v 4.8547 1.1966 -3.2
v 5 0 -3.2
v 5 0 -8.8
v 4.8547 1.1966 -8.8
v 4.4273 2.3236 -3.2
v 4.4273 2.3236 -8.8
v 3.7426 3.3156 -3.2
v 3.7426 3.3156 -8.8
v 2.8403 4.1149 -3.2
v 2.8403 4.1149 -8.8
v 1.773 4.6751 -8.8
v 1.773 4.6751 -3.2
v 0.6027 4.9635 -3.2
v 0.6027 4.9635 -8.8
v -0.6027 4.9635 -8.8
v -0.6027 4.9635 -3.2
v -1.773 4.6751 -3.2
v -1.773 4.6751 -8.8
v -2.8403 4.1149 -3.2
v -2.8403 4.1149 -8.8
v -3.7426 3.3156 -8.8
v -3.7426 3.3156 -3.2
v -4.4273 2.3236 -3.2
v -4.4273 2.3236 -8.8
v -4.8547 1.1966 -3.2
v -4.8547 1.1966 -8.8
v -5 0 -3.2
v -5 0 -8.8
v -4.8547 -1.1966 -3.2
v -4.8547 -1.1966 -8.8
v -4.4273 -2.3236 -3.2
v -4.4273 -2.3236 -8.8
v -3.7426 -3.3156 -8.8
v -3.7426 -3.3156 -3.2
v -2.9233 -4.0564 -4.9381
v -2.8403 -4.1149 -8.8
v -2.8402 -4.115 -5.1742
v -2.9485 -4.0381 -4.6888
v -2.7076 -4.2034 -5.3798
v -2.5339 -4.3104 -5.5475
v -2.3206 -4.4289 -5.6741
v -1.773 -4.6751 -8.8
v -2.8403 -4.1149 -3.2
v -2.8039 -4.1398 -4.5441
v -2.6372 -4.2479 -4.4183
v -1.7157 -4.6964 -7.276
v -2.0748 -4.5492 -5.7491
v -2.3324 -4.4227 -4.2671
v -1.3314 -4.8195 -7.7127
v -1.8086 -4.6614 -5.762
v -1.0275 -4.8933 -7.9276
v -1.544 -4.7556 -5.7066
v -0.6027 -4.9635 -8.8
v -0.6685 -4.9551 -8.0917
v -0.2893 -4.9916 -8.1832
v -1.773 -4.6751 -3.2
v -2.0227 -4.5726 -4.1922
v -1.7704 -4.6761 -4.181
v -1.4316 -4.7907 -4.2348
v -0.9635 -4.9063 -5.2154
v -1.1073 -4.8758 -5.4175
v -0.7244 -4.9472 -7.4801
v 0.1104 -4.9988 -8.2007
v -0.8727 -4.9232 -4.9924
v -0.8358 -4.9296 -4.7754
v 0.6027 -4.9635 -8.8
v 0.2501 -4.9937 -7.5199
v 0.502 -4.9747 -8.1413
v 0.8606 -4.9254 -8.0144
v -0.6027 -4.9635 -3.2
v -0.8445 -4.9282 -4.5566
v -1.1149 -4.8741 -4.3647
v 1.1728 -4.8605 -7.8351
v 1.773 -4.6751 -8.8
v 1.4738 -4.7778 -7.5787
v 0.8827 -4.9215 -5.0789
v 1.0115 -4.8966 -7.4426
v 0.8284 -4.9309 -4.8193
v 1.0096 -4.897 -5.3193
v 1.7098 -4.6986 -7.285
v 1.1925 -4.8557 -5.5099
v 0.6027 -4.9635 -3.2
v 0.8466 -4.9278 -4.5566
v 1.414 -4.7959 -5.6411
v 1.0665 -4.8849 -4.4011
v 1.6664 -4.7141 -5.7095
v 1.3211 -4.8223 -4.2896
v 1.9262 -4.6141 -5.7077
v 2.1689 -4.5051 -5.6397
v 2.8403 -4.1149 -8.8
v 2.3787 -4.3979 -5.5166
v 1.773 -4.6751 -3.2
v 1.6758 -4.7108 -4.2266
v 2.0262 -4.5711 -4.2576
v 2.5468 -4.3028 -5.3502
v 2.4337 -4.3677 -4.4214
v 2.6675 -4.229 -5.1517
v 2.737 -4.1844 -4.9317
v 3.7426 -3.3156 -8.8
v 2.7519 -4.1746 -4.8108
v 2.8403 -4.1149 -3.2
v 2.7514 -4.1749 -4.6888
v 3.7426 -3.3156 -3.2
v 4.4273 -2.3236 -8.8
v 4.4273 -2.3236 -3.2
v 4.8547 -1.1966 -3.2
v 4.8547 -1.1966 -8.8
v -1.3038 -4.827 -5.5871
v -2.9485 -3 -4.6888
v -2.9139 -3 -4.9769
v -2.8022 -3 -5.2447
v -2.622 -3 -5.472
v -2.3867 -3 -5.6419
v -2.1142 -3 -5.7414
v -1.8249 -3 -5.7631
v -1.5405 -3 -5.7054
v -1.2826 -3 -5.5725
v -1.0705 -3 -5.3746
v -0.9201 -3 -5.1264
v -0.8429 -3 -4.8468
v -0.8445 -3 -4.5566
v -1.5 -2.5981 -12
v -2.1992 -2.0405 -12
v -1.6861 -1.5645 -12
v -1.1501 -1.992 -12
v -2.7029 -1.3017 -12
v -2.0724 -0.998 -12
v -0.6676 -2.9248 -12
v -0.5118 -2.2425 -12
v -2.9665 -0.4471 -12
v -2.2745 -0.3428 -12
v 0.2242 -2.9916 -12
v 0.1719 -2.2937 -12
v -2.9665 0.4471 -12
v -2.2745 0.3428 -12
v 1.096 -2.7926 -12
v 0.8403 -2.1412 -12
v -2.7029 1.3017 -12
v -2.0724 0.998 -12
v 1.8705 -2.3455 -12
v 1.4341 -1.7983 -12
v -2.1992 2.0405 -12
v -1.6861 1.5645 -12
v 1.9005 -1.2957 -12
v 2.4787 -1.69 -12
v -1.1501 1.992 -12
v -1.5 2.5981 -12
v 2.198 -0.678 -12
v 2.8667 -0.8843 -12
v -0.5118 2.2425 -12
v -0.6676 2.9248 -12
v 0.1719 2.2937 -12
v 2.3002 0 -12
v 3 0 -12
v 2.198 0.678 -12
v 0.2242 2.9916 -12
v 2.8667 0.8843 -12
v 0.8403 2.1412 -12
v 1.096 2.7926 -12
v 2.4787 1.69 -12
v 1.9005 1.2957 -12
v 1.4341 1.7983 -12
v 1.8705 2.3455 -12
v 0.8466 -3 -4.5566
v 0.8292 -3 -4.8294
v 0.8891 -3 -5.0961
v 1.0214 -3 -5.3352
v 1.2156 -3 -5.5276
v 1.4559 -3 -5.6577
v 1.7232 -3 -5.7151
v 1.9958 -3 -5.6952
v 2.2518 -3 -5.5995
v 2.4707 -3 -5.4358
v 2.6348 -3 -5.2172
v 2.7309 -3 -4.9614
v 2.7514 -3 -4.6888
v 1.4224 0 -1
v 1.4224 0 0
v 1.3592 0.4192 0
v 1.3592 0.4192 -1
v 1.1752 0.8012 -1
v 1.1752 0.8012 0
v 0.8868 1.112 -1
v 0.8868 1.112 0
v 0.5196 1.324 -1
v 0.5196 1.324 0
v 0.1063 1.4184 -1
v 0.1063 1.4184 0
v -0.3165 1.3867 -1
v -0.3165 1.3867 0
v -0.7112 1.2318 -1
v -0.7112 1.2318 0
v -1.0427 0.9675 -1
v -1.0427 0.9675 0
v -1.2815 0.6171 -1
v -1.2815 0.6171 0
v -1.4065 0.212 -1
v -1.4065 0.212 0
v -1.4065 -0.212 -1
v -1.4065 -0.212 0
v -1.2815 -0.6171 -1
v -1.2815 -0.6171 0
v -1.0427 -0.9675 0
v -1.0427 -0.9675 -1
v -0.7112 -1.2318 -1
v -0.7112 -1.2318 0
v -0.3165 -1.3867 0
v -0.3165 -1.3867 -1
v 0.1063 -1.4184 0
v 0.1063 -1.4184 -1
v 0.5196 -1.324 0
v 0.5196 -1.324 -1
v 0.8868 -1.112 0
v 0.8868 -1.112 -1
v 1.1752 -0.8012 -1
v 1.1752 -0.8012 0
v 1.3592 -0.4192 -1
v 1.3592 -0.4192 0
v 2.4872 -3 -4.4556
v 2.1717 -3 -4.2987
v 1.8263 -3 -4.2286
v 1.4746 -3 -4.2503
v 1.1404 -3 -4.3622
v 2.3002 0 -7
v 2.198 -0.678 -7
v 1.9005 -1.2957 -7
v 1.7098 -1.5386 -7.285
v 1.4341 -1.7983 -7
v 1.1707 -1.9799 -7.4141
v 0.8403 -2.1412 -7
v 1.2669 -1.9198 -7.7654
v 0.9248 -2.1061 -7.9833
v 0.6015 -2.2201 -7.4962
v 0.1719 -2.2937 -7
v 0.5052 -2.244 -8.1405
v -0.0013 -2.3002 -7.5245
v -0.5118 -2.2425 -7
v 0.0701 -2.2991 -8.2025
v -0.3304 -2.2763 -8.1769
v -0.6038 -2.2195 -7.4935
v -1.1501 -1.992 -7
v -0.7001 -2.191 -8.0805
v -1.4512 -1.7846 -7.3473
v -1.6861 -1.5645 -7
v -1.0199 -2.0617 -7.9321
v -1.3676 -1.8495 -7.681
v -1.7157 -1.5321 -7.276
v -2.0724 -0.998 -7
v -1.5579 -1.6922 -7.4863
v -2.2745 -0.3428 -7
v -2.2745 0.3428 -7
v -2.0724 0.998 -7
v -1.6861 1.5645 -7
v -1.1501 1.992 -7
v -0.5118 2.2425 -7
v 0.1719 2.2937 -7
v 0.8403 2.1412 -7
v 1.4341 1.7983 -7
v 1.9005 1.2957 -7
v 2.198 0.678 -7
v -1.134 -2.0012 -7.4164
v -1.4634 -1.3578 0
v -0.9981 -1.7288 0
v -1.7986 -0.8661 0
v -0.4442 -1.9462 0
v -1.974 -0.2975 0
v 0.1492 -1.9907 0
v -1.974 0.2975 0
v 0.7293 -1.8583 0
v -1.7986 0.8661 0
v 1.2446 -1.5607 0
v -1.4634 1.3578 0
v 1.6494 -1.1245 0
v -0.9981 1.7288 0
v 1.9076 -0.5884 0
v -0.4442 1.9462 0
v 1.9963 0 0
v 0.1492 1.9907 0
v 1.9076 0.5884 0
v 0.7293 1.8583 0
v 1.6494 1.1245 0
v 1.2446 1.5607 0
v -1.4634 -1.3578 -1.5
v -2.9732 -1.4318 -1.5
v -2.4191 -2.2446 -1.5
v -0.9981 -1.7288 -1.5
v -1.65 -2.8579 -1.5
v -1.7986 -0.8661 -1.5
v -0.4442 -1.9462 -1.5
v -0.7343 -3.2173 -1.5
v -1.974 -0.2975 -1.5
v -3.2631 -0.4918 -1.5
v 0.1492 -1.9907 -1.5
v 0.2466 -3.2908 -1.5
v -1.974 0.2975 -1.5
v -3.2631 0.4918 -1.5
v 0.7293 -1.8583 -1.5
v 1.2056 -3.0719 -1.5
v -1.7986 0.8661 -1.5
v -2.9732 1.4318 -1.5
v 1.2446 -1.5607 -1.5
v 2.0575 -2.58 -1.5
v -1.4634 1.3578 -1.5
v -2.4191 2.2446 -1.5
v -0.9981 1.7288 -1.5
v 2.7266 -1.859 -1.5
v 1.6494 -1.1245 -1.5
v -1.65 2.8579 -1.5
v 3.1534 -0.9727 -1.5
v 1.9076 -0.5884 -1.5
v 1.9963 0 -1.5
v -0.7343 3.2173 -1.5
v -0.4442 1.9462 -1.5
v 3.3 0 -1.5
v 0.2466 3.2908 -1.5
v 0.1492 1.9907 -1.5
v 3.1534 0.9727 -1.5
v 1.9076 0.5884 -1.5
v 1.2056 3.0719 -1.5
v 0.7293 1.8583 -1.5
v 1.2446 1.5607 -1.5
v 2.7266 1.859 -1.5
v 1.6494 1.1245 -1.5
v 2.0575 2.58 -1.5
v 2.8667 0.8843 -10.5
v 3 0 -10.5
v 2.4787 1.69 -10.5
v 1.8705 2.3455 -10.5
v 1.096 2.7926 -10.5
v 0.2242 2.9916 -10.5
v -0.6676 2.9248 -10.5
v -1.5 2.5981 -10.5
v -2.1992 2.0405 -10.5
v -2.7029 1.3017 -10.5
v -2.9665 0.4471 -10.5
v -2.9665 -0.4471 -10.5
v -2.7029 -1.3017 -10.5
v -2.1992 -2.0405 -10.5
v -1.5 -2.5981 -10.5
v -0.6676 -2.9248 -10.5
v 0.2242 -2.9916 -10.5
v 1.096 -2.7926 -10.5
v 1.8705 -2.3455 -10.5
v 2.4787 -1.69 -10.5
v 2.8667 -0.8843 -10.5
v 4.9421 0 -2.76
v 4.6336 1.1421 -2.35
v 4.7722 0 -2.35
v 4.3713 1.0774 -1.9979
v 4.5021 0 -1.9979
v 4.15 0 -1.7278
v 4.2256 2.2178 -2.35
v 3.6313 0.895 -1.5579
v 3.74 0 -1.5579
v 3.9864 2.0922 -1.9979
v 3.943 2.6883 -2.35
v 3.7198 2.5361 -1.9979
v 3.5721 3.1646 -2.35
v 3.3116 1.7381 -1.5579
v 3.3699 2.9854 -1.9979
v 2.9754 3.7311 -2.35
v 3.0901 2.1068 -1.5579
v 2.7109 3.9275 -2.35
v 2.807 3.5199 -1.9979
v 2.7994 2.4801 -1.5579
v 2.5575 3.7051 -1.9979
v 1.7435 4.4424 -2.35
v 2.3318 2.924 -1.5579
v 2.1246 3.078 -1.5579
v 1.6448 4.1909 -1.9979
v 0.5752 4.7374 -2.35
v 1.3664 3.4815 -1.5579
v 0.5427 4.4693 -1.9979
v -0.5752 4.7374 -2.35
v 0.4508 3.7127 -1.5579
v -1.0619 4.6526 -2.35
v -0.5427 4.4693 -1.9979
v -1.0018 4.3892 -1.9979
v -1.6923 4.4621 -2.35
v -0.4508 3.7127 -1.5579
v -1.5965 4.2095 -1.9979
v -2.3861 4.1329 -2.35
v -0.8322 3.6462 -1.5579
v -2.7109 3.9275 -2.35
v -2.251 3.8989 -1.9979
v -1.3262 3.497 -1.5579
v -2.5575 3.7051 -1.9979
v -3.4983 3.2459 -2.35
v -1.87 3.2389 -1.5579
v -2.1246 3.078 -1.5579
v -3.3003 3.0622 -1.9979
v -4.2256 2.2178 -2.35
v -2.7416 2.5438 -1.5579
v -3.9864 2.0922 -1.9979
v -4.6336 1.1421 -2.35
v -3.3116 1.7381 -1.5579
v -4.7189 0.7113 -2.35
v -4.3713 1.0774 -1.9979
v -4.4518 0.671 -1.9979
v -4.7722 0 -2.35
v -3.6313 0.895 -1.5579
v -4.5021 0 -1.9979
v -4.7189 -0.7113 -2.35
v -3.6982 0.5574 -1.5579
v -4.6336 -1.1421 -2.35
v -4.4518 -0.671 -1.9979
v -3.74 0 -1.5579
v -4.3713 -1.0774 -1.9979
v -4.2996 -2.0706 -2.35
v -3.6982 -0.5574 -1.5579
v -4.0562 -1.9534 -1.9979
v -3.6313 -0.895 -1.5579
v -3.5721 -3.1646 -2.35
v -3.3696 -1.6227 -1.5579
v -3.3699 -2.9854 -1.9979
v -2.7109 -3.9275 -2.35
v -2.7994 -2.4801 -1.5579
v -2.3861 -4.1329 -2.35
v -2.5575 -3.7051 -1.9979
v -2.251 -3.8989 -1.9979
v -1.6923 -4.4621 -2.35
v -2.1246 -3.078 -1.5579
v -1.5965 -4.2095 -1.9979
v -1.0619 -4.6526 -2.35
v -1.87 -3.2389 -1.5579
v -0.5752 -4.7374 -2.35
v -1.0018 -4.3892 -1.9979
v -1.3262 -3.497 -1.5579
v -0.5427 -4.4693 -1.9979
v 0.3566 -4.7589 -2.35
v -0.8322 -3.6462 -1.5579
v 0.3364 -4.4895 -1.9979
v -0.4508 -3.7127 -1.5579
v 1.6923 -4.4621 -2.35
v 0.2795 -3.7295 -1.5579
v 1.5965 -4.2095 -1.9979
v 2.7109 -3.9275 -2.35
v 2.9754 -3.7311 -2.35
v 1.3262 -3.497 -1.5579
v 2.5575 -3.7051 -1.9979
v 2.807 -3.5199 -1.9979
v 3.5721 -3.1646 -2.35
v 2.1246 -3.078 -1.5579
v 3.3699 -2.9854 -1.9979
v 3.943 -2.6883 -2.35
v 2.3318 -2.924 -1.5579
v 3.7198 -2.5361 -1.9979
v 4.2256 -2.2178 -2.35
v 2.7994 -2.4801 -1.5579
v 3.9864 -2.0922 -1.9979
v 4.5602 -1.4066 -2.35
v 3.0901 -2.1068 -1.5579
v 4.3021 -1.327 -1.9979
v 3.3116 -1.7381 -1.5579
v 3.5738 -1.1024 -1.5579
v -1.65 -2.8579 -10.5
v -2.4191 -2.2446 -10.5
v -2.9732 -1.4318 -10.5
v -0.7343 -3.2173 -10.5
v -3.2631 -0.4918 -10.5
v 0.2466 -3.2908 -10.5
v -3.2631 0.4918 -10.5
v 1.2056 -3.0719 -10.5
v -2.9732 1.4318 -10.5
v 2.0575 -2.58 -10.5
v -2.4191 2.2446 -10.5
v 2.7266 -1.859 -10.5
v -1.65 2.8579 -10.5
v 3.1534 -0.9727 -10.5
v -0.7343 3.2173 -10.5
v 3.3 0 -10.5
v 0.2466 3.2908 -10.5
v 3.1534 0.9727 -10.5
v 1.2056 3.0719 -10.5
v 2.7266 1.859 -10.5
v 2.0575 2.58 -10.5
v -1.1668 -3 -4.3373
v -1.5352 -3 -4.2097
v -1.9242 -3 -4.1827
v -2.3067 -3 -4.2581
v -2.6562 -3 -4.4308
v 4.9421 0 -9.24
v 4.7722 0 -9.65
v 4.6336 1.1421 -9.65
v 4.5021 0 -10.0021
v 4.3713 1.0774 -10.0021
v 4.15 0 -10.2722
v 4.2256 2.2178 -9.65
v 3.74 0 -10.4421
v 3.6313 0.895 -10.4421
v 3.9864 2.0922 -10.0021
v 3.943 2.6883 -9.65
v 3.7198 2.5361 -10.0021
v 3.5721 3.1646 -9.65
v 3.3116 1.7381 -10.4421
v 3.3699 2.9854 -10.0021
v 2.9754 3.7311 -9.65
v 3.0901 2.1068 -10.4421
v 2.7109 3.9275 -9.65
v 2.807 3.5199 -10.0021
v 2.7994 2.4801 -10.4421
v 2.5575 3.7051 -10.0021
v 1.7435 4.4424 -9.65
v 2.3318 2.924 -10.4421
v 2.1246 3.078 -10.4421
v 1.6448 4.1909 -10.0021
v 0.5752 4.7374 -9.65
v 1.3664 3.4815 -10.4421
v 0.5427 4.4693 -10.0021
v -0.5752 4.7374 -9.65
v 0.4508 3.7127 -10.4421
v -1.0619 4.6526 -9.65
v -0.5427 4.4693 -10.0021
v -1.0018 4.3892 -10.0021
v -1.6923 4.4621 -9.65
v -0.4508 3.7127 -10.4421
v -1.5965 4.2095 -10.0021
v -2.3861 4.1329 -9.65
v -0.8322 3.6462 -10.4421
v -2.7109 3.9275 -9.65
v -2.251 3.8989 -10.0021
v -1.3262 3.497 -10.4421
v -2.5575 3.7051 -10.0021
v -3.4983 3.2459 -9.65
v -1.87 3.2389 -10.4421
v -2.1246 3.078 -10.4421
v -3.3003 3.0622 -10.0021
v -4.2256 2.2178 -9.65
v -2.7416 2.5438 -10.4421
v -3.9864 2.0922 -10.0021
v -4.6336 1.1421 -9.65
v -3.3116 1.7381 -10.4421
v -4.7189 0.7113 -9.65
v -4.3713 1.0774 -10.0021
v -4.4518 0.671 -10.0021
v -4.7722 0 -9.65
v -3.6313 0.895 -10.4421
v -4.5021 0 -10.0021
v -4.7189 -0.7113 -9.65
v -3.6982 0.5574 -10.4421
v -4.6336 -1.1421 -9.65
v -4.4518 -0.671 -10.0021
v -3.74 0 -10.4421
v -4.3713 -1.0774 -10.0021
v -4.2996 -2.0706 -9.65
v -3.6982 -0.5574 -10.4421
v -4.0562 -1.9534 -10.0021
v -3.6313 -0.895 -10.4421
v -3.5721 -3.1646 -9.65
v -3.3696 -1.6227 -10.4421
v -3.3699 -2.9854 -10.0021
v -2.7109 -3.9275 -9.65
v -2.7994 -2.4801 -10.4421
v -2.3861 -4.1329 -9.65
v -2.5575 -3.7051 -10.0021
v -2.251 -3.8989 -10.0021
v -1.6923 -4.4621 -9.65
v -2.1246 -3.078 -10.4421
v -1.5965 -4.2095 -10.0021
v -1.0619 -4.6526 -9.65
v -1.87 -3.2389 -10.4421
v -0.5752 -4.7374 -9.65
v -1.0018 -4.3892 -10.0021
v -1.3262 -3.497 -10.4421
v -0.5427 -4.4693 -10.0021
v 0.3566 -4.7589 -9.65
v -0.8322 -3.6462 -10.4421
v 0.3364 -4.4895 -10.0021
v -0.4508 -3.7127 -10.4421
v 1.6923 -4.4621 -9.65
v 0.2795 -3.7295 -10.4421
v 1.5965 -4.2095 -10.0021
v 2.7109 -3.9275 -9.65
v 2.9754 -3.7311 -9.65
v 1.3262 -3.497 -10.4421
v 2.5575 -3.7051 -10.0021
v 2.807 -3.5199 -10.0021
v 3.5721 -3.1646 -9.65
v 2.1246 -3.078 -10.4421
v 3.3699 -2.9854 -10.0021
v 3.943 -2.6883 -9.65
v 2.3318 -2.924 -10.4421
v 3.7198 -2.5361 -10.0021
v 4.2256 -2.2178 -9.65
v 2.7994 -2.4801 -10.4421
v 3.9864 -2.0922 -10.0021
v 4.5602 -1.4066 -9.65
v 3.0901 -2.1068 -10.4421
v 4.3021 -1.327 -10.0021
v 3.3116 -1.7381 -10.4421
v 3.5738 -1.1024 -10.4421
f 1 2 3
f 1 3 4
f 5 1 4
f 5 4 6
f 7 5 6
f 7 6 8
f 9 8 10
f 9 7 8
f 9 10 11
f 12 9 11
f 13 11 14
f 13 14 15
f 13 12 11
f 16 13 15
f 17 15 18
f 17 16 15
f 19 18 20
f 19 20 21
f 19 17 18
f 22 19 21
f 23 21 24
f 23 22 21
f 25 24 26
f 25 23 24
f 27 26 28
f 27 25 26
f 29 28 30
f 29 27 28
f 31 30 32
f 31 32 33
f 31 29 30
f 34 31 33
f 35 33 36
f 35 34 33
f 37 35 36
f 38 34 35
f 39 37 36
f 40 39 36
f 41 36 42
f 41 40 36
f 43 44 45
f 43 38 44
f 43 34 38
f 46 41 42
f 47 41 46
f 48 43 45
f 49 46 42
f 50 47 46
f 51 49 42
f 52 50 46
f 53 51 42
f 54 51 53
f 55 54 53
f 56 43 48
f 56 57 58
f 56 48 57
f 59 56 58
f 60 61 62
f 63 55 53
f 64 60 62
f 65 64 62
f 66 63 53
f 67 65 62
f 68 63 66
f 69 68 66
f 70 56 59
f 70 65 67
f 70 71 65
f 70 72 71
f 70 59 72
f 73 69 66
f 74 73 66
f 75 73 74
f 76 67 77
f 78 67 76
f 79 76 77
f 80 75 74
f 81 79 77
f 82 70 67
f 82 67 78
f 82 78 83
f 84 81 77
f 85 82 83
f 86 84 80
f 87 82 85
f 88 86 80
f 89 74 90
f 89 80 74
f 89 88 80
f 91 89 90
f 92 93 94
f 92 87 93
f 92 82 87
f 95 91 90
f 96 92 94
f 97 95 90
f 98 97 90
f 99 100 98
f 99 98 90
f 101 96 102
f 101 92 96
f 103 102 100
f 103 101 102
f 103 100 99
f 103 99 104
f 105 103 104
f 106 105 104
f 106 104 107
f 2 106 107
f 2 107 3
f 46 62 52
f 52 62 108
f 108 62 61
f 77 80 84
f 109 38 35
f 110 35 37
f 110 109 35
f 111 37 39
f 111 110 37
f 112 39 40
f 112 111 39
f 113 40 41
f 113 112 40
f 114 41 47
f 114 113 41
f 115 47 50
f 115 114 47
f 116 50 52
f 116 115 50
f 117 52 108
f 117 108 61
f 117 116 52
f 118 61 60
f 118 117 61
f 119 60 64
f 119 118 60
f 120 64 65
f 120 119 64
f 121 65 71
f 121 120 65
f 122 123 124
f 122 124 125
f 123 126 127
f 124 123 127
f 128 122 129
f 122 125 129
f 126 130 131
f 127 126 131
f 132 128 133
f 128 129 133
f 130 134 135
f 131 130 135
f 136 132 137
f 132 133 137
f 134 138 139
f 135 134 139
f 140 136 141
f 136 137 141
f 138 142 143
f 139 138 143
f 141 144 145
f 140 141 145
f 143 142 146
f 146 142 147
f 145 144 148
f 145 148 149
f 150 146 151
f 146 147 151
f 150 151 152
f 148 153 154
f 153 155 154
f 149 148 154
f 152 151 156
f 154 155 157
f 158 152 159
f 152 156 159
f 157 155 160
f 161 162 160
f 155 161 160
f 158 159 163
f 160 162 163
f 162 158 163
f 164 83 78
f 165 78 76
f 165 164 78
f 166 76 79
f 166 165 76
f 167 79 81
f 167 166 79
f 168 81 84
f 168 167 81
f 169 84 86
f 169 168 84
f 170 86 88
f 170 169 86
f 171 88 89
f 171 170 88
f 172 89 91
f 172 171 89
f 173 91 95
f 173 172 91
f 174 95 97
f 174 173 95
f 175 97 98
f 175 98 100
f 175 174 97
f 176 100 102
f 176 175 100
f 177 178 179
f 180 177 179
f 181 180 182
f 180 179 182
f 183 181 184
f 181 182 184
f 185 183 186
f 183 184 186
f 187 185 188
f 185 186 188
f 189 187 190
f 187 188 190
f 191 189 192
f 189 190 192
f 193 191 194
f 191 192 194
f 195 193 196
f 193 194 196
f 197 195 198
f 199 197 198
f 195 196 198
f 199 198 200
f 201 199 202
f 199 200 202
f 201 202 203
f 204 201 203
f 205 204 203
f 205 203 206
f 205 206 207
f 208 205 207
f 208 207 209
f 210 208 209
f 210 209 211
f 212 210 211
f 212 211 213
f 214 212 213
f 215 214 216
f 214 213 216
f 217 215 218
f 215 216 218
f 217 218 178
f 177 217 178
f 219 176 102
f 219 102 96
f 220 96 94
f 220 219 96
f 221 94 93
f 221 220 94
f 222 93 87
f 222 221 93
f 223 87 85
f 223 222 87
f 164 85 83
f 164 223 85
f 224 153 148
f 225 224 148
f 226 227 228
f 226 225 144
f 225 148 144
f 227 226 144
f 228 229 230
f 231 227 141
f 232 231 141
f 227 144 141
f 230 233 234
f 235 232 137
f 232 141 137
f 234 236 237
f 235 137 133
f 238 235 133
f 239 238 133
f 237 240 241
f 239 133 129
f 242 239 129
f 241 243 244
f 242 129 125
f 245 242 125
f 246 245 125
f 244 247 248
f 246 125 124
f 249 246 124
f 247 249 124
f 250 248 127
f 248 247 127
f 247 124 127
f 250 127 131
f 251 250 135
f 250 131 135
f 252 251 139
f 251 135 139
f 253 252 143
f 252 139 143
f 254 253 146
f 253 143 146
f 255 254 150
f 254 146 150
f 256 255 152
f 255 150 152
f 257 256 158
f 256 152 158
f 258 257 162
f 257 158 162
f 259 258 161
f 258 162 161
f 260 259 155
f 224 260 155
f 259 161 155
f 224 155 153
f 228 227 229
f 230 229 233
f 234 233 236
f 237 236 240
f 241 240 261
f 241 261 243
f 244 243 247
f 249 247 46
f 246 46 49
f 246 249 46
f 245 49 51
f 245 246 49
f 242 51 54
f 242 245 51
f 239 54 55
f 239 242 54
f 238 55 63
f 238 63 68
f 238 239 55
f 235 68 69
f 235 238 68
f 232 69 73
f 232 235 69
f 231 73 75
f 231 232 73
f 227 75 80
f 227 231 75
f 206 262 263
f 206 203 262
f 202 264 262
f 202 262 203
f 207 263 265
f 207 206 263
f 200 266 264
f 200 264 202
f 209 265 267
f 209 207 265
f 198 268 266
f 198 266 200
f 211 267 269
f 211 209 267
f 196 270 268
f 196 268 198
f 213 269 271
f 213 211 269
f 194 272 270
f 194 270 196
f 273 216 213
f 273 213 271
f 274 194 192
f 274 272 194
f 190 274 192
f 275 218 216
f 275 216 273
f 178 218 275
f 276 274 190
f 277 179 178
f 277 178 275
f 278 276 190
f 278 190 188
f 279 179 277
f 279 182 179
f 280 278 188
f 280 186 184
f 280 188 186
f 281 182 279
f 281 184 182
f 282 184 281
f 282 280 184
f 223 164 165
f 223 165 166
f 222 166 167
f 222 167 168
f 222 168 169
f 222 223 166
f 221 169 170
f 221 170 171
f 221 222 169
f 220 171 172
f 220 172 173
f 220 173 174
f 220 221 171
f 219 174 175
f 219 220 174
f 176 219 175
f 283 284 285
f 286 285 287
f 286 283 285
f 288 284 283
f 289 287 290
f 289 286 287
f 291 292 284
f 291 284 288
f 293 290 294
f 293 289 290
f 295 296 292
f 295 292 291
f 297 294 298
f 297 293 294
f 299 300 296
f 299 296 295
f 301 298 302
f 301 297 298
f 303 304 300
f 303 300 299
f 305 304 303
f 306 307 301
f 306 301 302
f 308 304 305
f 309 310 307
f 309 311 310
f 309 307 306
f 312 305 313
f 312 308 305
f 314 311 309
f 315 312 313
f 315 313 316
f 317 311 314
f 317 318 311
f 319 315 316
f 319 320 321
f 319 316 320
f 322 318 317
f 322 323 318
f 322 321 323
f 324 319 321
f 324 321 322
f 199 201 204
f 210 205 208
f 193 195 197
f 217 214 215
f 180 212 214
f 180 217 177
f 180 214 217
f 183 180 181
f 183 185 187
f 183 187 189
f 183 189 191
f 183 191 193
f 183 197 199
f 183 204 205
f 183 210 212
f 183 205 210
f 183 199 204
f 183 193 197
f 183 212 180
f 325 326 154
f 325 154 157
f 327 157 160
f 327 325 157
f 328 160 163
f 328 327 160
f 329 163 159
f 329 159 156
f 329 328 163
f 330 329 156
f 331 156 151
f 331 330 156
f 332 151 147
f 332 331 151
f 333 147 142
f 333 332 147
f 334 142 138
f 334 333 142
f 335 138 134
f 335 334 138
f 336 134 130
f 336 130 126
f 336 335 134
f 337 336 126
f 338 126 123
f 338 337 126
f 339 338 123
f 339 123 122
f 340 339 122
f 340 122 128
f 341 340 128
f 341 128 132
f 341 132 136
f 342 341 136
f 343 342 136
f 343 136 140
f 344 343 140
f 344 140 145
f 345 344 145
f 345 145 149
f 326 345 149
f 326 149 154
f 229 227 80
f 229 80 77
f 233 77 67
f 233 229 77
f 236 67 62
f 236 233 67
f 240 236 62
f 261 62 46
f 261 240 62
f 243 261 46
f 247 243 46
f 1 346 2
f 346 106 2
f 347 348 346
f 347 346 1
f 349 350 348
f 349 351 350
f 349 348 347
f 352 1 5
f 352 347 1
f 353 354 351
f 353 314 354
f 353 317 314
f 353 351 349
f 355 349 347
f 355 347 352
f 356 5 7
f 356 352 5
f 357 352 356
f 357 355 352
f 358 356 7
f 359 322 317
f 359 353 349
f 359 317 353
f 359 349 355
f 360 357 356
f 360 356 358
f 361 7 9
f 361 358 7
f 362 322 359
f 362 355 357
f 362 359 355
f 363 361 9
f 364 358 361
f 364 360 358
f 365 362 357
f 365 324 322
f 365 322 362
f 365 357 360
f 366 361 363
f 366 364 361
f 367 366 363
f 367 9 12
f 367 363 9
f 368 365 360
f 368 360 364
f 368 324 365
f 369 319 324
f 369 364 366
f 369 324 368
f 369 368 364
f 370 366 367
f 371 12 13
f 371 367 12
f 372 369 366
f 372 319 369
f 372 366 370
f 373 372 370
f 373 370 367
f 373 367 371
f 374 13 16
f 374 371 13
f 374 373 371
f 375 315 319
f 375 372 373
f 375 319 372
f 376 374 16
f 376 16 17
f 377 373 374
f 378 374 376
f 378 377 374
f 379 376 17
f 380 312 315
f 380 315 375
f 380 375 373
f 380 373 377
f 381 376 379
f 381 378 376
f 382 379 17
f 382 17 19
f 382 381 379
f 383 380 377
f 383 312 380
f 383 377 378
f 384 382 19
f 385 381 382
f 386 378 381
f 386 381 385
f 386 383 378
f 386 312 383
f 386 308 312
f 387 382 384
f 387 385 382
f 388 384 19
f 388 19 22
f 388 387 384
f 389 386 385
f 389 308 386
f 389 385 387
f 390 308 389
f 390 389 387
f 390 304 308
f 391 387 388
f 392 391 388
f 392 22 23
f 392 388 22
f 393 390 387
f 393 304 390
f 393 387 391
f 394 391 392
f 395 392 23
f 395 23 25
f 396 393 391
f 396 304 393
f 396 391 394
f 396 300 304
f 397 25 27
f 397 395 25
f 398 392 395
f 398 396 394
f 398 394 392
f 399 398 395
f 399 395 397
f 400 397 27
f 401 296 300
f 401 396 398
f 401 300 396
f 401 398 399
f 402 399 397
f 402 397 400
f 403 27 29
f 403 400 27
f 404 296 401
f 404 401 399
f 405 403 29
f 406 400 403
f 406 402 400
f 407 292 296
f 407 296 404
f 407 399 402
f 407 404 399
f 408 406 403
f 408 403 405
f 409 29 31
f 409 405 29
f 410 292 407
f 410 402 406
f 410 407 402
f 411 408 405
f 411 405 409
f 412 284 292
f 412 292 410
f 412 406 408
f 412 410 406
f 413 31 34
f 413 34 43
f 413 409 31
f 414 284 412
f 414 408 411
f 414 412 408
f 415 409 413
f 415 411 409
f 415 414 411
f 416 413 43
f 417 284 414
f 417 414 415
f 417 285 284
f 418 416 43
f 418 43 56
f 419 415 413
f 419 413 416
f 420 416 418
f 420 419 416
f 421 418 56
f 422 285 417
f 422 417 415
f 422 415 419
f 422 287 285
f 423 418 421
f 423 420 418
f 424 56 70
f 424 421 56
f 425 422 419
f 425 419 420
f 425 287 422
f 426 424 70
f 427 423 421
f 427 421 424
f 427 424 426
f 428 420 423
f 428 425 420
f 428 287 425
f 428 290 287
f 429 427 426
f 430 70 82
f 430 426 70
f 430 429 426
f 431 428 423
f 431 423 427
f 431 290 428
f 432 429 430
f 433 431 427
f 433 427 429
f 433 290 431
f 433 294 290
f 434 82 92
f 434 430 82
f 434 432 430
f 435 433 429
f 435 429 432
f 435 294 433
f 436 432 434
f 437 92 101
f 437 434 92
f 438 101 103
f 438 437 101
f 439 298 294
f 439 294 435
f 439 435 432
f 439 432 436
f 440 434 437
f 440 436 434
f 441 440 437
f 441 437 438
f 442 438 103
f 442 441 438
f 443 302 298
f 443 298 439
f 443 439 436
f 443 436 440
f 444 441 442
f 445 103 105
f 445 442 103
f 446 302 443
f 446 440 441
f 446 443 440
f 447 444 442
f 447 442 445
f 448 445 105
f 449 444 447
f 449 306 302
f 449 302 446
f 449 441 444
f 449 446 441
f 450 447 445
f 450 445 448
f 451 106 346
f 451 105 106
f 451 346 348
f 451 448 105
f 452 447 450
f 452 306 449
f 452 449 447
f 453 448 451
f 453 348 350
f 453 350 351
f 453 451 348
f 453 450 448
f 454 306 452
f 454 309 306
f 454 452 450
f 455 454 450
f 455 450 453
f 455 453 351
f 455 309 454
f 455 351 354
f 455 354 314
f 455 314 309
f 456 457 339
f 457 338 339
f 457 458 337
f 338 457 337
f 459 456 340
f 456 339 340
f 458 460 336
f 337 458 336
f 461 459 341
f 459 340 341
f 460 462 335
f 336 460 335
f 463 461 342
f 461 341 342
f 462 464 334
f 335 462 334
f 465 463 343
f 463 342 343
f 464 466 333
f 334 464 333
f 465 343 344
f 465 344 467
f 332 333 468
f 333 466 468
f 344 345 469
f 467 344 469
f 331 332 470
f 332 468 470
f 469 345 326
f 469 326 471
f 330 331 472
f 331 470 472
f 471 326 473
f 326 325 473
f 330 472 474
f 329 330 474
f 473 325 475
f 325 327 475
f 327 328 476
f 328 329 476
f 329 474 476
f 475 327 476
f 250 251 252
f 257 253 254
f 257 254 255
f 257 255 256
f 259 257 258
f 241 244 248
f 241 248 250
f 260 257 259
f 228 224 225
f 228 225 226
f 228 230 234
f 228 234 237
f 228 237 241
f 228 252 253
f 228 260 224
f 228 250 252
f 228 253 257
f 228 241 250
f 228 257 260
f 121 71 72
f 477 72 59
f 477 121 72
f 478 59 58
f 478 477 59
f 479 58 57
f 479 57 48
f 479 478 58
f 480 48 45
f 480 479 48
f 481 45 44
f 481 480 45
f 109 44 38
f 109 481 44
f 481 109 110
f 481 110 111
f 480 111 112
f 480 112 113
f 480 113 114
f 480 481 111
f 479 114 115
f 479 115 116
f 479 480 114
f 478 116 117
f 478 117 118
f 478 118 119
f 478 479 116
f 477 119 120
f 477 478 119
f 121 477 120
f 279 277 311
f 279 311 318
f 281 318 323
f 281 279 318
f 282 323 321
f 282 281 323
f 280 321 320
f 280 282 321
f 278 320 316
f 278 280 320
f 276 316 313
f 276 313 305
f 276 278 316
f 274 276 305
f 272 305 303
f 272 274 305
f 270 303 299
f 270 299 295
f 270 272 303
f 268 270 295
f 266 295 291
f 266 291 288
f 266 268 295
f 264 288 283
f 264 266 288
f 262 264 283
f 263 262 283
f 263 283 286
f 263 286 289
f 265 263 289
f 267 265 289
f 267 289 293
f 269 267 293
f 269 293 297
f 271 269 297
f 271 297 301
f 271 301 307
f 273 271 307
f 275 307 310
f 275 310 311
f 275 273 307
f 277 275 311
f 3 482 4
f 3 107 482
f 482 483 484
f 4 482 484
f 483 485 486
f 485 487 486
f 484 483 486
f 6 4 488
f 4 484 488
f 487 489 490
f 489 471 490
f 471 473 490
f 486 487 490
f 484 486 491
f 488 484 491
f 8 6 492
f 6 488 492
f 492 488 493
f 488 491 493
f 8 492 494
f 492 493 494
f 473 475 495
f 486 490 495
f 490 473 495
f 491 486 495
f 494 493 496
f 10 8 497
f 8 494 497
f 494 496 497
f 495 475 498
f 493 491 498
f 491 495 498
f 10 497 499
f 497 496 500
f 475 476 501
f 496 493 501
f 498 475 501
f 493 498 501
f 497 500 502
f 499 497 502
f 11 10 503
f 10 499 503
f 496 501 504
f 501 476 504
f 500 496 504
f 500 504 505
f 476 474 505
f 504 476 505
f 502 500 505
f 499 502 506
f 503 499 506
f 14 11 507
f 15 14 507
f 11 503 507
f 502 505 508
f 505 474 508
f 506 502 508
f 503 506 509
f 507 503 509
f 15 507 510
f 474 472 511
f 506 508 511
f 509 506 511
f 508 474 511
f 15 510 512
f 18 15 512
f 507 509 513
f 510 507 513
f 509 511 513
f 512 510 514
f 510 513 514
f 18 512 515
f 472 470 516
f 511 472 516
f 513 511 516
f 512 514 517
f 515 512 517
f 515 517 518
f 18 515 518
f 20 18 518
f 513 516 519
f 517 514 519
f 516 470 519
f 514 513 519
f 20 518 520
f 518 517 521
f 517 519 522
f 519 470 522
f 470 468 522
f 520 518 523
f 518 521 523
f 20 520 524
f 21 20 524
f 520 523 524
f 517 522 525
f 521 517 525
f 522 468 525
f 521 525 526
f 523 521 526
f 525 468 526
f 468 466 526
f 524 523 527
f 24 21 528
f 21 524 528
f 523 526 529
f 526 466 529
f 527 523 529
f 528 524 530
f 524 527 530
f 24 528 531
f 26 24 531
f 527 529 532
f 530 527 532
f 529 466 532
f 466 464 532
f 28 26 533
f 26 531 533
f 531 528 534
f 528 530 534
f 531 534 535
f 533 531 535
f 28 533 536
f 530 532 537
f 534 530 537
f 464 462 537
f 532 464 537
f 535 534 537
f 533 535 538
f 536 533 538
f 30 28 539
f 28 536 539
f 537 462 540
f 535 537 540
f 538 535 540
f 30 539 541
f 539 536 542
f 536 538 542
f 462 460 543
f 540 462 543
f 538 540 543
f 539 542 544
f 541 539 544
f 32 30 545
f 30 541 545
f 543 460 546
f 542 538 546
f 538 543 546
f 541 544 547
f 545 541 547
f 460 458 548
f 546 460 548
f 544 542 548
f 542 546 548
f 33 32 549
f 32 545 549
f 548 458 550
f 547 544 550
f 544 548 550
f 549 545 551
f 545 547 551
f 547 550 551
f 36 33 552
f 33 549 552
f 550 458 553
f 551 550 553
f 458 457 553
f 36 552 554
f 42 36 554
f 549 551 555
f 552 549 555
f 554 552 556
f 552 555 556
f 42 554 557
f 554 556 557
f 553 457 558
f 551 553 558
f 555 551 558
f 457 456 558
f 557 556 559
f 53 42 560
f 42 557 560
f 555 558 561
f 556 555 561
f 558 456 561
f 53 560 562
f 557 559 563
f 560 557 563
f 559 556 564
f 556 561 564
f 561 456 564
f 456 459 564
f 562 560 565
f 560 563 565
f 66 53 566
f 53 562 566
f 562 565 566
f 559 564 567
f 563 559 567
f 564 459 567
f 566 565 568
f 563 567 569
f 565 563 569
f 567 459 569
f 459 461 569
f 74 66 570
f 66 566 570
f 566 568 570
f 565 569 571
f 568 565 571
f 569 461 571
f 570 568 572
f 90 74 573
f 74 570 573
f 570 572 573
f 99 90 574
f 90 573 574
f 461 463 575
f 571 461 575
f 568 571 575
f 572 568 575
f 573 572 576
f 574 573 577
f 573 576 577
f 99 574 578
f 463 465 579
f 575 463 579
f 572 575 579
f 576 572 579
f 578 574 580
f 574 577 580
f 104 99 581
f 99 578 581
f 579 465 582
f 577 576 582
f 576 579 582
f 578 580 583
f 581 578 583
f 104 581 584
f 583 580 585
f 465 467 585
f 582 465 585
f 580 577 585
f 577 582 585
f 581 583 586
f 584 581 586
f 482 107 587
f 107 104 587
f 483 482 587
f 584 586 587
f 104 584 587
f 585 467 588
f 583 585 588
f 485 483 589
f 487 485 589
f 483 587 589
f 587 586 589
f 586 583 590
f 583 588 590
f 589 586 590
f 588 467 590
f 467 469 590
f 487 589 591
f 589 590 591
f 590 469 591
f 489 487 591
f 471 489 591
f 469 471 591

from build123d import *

# Parameters (mm, degrees)
F0_R      = 3
F1_DEPTH  = 12
F2_R      = 3.203206237
F2_R_2    = 1.9962564084
F3_DEPTH  = 1.5
F4_R      = 5
F5_DEPTH  = 9
F6_R      = 1.7
F7_R      = 1.4223649875
F8_DEPTH  = 1
F9_R      = 2.3001696125
F10_DEPTH = 5
F12_DEPTH = 25
F13_DEPTH = 3


with BuildPart() as f1:
    # F0 (on Top) → F1 (new body)
    with BuildSketch(Plane.XY):
        Circle(F0_R)
    extrude(amount=-F1_DEPTH)

    # F2 (on face) → F3 (cut)
    with BuildSketch(Plane.XY):
        Circle(F2_R)
        Circle(F2_R_2, mode=Mode.SUBTRACT)
    extrude(amount=-F3_DEPTH, mode=Mode.SUBTRACT)

    # F4 (on face) → F5 (join)
    with BuildSketch(Plane.XY.offset(-1.5)):
        Circle(F4_R)
    extrude(amount=-F5_DEPTH)

    # F6
    f6_edges = [f1.edges().sort_by_distance(p)[0] for p in [
        (5, 0, -6),
        (-5, 0, -1.5),
        (-5, 0, -10.5),
    ]]
    fillet(f6_edges, radius=F6_R)

    # F7 (on face) → F8 (cut)
    with BuildSketch(Plane.XY):
        Circle(F7_R)
    extrude(amount=-F8_DEPTH, mode=Mode.SUBTRACT)

    # F9 (on face) → F10 (cut)
    with BuildSketch(Plane(origin=(0, 0, -12), x_dir=(1, 0, 0), z_dir=(0, 0, -1))):
        Circle(F9_R)
    extrude(amount=-F10_DEPTH, mode=Mode.SUBTRACT)

    # F11 (on Front) → F12 (cut)
    with BuildSketch(Plane.XZ):
        with BuildLine():
            ThreePointArc((1.7097895663, -7.2849687191), (-0.003580854, -7.5244880061), (-1.715676859, -7.2760228068))
            ThreePointArc((-1.715676859, -7.2760228068), (-0.0053546607, -8.2036937796), (1.7097895663, -7.2849687191))
        make_face()
        with BuildLine():
            ThreePointArc((-2.9485186096, -4.6888017096), (-1.8248803235, -5.7631106344), (-0.84451411, -4.5566344634))
            ThreePointArc((-0.84451411, -4.5566344634), (-1.924158161, -4.1826811203), (-2.9485186096, -4.6888017096))
        make_face()
        with BuildLine():
            ThreePointArc((0.8465747233, -4.5566344634), (1.7231712571, -5.7150981177), (2.7513615138, -4.6888017096))
            ThreePointArc((2.7513615138, -4.6888017096), (1.826312953, -4.2286258966), (0.8465747233, -4.5566344634))
        make_face()
    extrude(amount=F12_DEPTH, mode=Mode.SUBTRACT)

    # F13 (add): faces of the model
    f13_faces = [f1.faces().sort_by_distance(p)[0] for p in [
        (-1.8763016609, 0, -4.9445210943),
        (1.7765781537, 0, -4.9454009795),
    ]]
    extrude(f13_faces, amount=F13_DEPTH)


solid = f1.part
